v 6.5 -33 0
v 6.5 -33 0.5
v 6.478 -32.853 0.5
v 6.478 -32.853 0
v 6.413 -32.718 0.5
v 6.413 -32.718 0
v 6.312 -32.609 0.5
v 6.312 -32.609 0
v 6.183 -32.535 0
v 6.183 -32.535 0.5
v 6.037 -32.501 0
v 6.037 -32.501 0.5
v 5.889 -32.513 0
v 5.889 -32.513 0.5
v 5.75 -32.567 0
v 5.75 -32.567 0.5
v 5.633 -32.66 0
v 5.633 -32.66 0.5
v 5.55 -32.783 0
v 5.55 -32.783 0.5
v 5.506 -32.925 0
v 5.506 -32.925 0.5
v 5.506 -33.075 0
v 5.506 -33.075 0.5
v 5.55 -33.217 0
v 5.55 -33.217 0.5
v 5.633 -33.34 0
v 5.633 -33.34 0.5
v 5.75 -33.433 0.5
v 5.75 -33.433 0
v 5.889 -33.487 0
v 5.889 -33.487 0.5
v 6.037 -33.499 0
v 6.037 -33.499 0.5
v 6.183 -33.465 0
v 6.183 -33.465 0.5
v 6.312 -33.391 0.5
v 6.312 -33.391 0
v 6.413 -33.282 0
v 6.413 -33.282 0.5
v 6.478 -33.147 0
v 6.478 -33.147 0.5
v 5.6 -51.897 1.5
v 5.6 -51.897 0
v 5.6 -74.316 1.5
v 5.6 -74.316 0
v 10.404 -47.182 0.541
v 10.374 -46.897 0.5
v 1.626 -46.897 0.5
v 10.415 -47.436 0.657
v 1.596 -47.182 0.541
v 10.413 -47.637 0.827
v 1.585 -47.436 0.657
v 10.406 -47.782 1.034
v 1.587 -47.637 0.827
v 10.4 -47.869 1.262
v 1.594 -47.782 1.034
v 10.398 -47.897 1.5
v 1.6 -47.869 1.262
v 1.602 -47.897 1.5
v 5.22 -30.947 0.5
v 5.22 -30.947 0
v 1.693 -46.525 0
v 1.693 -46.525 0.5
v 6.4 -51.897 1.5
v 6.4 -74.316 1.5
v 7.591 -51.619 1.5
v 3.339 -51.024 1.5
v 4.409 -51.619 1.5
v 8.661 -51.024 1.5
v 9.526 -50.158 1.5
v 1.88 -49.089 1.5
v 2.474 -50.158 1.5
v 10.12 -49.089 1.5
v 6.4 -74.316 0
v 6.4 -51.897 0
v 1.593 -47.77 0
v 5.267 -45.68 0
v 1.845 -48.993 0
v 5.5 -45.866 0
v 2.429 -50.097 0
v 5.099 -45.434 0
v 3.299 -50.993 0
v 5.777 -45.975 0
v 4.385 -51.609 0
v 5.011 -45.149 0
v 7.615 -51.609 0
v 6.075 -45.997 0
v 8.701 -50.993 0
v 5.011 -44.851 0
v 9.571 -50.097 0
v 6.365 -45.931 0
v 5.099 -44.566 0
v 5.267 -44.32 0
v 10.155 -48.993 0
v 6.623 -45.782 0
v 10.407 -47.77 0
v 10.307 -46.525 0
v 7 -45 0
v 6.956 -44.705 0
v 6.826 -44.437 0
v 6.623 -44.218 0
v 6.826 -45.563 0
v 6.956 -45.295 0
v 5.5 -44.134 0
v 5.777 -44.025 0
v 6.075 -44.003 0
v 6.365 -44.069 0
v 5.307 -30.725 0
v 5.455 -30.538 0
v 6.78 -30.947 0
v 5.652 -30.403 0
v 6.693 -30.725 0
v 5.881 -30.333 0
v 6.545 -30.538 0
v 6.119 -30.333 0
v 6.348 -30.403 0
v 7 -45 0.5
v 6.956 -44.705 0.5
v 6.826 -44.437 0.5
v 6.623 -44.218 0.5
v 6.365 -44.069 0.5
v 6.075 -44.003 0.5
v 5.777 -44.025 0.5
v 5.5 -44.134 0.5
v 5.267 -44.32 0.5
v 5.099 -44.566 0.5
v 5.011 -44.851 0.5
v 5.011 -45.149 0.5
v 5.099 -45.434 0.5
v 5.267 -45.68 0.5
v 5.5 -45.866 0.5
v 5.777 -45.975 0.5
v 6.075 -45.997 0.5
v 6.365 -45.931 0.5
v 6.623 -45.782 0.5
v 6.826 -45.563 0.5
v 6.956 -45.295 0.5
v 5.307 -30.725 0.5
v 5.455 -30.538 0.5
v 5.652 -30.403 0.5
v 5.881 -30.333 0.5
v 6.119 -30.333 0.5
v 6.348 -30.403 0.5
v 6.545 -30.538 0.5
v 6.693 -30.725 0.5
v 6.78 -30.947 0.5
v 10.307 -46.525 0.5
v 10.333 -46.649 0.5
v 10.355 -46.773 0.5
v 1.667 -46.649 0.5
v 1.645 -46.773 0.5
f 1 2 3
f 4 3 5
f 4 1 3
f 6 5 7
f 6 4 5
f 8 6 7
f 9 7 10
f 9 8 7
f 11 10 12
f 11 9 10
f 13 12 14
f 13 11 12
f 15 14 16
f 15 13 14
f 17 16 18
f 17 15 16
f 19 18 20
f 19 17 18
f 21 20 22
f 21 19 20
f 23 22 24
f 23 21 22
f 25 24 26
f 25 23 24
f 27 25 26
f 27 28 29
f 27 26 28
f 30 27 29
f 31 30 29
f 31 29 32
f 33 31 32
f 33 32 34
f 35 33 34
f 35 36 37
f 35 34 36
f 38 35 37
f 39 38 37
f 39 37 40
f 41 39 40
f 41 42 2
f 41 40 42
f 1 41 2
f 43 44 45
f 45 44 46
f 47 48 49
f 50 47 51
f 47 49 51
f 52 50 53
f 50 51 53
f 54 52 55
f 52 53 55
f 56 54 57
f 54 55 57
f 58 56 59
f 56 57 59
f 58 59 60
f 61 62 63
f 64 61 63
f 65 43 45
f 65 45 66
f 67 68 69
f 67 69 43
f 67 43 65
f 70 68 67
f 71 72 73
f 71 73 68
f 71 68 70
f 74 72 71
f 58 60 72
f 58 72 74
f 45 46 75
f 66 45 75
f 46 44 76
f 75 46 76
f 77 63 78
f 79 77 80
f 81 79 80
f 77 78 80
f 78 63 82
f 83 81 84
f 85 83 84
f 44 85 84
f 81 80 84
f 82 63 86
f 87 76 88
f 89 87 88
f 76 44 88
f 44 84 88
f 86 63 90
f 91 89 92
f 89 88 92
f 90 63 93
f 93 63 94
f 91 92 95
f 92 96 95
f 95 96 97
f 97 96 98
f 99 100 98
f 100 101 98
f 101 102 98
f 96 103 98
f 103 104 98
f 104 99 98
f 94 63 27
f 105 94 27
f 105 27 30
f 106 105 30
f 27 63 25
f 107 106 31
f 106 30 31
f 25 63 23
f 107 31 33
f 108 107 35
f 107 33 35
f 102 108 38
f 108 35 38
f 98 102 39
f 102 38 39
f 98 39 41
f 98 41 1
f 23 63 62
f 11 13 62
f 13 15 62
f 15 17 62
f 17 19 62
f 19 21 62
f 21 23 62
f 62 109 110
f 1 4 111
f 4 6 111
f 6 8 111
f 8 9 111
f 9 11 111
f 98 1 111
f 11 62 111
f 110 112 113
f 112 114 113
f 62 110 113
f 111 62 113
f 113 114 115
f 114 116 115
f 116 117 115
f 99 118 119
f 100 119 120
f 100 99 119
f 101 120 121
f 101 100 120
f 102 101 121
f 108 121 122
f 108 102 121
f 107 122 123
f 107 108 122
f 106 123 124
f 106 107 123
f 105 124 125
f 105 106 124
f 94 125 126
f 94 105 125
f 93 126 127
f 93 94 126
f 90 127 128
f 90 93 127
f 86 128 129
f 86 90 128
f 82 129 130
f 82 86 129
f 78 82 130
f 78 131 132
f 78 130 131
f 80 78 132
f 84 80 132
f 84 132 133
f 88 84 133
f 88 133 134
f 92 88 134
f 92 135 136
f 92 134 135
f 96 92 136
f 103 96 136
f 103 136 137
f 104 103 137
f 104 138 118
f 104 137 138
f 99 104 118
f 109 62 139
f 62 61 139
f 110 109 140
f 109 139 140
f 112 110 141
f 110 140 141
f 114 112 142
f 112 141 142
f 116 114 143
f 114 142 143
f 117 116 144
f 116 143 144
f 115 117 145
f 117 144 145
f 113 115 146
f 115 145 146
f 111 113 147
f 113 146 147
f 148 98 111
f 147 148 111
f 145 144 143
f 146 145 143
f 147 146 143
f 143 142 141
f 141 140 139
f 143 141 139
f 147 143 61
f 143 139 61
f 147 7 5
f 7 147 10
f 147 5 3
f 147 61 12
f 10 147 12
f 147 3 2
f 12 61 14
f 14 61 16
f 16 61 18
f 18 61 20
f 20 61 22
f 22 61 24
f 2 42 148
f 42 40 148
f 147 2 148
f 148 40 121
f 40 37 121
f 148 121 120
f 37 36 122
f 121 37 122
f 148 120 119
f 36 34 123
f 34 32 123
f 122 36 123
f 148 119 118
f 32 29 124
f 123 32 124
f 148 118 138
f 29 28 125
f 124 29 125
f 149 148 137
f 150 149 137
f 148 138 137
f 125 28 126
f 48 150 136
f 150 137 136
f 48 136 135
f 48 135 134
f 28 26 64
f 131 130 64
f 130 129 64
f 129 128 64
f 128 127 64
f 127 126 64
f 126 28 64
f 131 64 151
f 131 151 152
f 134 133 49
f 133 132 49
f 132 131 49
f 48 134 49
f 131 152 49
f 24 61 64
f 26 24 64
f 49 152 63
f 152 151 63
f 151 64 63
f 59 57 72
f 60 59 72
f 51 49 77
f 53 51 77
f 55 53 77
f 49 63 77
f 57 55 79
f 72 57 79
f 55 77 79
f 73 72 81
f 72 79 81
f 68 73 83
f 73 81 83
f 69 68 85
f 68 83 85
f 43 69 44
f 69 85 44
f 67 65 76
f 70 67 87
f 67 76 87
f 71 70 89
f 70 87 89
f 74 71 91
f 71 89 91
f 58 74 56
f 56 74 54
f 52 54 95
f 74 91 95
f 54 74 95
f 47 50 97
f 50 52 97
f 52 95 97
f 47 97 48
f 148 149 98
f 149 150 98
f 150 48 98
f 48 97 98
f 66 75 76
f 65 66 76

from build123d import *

# Parameters (mm, degrees)
SKETCH1_R               = 0.5
SKETCH1_R_2             = 1
BOSS_EXTRUDE1_DEPTH     = 1.5
CUT_EXTRUDE1_DEPTH      = 11.41549897
CUT_EXTRUDE1_DEPTH_BACK = 1
FILLET1_R               = 0.8


with BuildPart() as part:
    # Sketch1 → Boss-Extrude1 (new body)
    with BuildSketch(Plane.XY):
        with BuildLine():
            Line((6, -27.5), (1.693454448, -46.525168442))
            ThreePointArc((1.693454448, -46.525168442), (2.428871416, -50.096858061), (5.6, -51.897343647))
            Line((5.6, -51.897343647), (5.6, -74.316095527))
            Line((5.6, -74.316095527), (6.4, -74.316095527))
            Line((6.4, -74.316095527), (6.4, -51.897343647))
            ThreePointArc((6.4, -51.897343647), (9.571128584, -50.096858061), (10.306545552, -46.525168442))
            Line((10.306545552, -46.525168442), (6, -27.5))
        make_face()
        with Locations((6, -33)):
            Circle(SKETCH1_R, mode=Mode.SUBTRACT)
        with Locations((6, -45)):
            Circle(SKETCH1_R_2, mode=Mode.SUBTRACT)
    extrude(amount=BOSS_EXTRUDE1_DEPTH)

    # Sketch2 → Cut-Extrude1 (cut, two sides)
    with BuildSketch(Plane(origin=(0, 0, 0), x_dir=(0, 0, -1), z_dir=(1, 0, 0))) as cut_extrude1_sk:
        with BuildLine():
            Line((-1.5, -14.744083324), (-0.5, -14.744083324))
            Line((-0.5, -14.744083324), (-0.5, -46.897343647))
            ThreePointArc((-0.5, -46.897343647), (-0.792893219, -47.604450429), (-1.5, -47.897343647))
            Line((-1.5, -47.897343647), (-1.5, -14.744083324))
        make_face()
    extrude(amount=CUT_EXTRUDE1_DEPTH, mode=Mode.SUBTRACT)
    extrude(cut_extrude1_sk.sketch, amount=-CUT_EXTRUDE1_DEPTH_BACK, mode=Mode.SUBTRACT)

    # Fillet1
    fillet1_edges = [part.edges().sort_by_distance(p)[0] for p in [
        (6, -27.5, 0.25),
    ]]
    fillet(fillet1_edges, radius=FILLET1_R)


solid = part.part
